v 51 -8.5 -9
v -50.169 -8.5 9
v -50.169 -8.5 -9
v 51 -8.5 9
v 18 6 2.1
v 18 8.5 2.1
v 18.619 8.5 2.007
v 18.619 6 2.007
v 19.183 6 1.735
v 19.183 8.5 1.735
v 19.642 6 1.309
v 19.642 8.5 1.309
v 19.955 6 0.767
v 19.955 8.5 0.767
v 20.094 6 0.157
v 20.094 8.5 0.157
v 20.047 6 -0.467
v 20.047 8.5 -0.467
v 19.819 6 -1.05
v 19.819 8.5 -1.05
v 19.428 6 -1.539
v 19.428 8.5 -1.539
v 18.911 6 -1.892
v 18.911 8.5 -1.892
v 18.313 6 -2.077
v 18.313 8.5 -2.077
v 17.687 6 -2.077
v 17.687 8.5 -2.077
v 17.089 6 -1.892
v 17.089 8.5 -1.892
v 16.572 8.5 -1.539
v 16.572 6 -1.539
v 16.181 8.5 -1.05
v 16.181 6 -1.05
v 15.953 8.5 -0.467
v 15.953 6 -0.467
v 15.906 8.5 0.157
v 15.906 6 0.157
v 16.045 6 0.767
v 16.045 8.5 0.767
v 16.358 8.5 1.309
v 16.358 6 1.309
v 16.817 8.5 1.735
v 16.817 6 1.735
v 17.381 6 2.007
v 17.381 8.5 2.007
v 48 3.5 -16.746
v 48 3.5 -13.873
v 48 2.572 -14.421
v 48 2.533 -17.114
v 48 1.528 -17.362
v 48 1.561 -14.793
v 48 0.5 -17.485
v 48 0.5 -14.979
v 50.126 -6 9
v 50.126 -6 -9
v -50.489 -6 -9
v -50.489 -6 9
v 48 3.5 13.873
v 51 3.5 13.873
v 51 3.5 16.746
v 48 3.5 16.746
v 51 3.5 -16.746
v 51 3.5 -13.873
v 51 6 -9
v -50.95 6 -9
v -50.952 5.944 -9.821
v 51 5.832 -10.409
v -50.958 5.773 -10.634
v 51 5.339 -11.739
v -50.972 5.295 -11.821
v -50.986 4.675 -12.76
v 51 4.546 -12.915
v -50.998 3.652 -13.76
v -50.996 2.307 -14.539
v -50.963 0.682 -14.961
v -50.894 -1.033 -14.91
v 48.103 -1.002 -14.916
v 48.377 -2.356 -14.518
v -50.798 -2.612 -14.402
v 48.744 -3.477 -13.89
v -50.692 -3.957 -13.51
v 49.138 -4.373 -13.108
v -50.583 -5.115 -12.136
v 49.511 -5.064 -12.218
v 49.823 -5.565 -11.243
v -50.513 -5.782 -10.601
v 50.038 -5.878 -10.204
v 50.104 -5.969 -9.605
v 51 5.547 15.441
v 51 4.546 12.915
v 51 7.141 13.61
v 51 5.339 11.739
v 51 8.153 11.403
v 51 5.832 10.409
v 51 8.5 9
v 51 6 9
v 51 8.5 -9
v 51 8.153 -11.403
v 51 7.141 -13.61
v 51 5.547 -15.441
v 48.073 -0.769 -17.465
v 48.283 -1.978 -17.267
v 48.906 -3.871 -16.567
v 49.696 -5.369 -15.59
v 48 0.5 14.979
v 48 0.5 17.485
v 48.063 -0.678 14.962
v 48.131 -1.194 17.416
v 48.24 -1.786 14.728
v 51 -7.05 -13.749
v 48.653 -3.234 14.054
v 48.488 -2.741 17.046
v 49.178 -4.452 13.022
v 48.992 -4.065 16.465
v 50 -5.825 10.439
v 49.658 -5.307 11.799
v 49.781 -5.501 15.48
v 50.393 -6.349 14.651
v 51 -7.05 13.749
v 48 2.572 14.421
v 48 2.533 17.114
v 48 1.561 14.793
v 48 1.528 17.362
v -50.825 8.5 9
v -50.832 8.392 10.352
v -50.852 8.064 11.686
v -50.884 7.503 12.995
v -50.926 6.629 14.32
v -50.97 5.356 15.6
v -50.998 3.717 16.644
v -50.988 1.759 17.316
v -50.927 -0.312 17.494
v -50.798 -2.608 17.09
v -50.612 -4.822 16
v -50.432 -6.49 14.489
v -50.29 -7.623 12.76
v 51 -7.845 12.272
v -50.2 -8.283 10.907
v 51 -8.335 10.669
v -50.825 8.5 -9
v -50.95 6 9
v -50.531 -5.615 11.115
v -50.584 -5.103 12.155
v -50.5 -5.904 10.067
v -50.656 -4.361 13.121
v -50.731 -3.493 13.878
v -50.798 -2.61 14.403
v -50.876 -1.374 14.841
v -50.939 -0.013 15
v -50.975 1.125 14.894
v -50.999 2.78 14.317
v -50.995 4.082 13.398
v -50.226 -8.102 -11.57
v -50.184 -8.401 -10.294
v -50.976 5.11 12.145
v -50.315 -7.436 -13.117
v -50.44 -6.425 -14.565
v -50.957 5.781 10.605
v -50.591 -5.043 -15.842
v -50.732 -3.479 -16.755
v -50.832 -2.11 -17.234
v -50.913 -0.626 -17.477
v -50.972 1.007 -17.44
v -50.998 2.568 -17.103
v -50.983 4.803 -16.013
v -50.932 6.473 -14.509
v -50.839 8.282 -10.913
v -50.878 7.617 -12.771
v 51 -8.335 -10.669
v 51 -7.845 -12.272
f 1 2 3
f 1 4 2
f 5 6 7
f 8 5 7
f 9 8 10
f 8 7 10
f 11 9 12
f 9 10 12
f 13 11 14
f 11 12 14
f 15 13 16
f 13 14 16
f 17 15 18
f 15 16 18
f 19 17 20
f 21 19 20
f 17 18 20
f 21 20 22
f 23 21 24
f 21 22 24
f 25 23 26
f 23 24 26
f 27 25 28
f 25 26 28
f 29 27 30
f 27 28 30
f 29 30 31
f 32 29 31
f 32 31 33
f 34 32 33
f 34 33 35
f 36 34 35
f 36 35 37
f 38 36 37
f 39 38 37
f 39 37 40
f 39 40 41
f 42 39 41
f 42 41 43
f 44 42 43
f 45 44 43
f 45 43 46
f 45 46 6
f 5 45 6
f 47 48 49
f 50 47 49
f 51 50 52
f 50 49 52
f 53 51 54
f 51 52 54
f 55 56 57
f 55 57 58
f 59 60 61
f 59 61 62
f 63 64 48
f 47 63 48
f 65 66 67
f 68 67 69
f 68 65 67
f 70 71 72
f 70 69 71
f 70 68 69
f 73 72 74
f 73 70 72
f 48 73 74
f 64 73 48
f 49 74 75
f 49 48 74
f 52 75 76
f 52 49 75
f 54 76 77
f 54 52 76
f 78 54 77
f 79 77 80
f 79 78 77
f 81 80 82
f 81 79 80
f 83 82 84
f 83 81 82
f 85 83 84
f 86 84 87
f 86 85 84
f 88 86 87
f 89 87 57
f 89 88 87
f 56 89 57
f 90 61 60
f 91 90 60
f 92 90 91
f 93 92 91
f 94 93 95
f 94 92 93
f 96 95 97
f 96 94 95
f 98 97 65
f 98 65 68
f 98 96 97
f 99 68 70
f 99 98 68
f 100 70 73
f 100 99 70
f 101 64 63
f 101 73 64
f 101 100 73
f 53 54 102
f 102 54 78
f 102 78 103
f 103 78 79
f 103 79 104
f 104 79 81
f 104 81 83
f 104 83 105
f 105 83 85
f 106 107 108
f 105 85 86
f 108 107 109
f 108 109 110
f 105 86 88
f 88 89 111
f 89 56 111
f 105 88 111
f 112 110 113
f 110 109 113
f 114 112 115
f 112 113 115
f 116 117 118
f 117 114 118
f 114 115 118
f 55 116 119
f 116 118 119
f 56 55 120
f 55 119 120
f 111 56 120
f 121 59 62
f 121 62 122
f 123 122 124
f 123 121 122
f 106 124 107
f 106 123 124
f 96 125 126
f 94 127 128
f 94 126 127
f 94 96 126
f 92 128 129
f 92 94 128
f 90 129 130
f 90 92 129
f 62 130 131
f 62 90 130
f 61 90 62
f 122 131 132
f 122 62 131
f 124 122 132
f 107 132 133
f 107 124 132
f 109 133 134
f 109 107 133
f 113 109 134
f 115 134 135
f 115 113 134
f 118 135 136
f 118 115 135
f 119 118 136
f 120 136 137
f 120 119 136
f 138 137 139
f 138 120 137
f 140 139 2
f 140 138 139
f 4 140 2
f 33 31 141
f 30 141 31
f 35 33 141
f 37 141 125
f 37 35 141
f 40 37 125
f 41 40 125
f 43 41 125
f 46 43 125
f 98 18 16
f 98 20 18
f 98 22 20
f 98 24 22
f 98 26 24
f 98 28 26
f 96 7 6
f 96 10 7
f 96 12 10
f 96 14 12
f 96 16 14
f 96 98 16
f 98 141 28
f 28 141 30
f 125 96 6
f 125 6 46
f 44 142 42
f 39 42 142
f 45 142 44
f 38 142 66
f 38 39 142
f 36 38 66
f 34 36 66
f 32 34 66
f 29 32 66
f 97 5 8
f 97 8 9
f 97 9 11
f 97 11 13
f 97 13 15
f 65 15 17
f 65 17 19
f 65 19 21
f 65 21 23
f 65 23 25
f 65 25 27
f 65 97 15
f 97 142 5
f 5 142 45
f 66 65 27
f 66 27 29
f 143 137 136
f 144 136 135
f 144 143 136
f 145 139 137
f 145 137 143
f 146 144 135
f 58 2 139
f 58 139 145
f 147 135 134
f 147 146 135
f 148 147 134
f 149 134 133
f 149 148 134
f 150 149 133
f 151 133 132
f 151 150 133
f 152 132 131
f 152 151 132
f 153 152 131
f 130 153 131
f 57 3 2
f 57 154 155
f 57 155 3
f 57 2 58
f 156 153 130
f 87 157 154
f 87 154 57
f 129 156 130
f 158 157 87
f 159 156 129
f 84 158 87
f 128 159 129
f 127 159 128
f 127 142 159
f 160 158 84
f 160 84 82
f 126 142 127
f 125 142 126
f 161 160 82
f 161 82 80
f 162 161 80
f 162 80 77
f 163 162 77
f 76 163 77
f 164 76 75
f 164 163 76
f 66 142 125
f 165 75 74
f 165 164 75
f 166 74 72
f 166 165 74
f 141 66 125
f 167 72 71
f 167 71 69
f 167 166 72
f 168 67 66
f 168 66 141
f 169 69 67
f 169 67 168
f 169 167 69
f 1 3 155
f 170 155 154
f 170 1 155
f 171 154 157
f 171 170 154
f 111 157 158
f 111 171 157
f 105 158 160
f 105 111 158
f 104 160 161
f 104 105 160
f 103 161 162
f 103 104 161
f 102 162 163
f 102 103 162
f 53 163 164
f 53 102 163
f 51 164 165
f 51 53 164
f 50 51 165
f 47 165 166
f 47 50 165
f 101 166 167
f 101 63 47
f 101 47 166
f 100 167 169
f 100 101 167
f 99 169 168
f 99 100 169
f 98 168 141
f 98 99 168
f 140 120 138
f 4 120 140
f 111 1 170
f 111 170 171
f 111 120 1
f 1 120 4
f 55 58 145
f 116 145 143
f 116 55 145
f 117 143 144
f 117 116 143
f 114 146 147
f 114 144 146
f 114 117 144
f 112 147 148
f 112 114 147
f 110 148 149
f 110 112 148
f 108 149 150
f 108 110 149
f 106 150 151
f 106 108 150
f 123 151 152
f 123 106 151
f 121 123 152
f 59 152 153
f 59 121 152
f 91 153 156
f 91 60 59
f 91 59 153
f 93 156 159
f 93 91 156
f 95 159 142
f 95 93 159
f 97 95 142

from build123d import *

# Parameters (mm, degrees)
EXTRUSION1_DEPTH             = 51
ENL_V_MAT_EXTRU_2_DEPTH      = 18.5
ENL_V_MAT_EXTRU_2_DEPTH_BACK = 18.5
ENL_V_MAT_EXTRU_3_REACH      = 19
ESQUISSE4_R                  = 2.1
ENL_V_MAT_EXTRU_4_DEPTH      = 18.5000001
ENL_V_MAT_EXTRU_4_DEPTH_BACK = 18.5000001


with BuildPart() as part:
    # Esquisse1 → Extrusion1 (new body, symmetric)
    with BuildSketch(Plane(origin=(0, 0, 0), x_dir=(0, 0, -1), z_dir=(1, 0, 0))):
        with BuildLine():
            Line((-9, -8.5), (9, -8.5))
            ThreePointArc((9, -8.5), (17.5, 0), (9, 8.5))
            Line((9, 8.5), (-9, 8.5))
            ThreePointArc((-9, 8.5), (-17.5, 0), (-9, -8.5))
        make_face()
        with BuildLine():
            Line((-9, 6), (9, 6))
            ThreePointArc((9, 6), (15, 0), (9, -6))
            Line((9, -6), (-9, -6))
            ThreePointArc((-9, -6), (-15, 0), (-9, 6))
        make_face(mode=Mode.SUBTRACT)
    extrude(amount=EXTRUSION1_DEPTH, both=True)

    # Esquisse3 → Enlèv. mat.-Extru.2 (cut, two sides)
    with BuildSketch(Plane.XY) as enl_v_mat_extru_2_sk:
        with BuildLine():
            Line((51, 3.5), (48, 3.5))
            Line((48, 3.5), (48, 0.5))
            ThreePointArc((48, 0.5), (48.77747585, -3.562019202), (51, -7.049834435))
            Line((51, -7.049834435), (51, 3.5))
        make_face()
    extrude(amount=ENL_V_MAT_EXTRU_2_DEPTH, mode=Mode.SUBTRACT)
    extrude(enl_v_mat_extru_2_sk.sketch, amount=-ENL_V_MAT_EXTRU_2_DEPTH_BACK, mode=Mode.SUBTRACT)

    # Esquisse4 → Enlèv. mat.-Extru.3 (cut, up to next)
    with BuildSketch(Plane(origin=(0, 8.5, 0), x_dir=(-1, 0, 0), z_dir=(0, 1, 0)), mode=Mode.PRIVATE) as enl_v_mat_extru_3_sk1:
        with Locations(Location((-18, 0, 0), (0, 0, 90))):  # turned: the seam where the file's is
            Circle(ESQUISSE4_R)
    enl_v_mat_extru_3_tool1 = extrude(enl_v_mat_extru_3_sk1.sketch, amount=-ENL_V_MAT_EXTRU_3_REACH, mode=Mode.PRIVATE) & part.part
    add(enl_v_mat_extru_3_tool1.solids().sort_by_distance((18, 8.5, 0))[0], mode=Mode.SUBTRACT)

    # Esquisse5 → Enlèv. mat.-Extru.4 (cut, two sides)
    with BuildSketch(Plane.XY) as enl_v_mat_extru_4_sk:
        with BuildLine():
            Line((60.682276478, -226.426742354), (-41.324705982, -35.5))
            ThreePointArc((-41.324705982, -35.5), (-49.153043001, -14.164640947), (-50.824705982, 8.5))
            Line((-50.824705982, 8.5), (-36.678065011, 224.505365595))
            Line((-36.678065011, 224.505365595), (-459.862900179, 133.135912547))
            Line((-459.862900179, 133.135912547), (-362.50255869, -317.796195402))
            Line((-362.50255869, -317.796195402), (60.682276478, -226.426742354))
        make_face()
    extrude(amount=ENL_V_MAT_EXTRU_4_DEPTH, mode=Mode.SUBTRACT)
    extrude(enl_v_mat_extru_4_sk.sketch, amount=-ENL_V_MAT_EXTRU_4_DEPTH_BACK, mode=Mode.SUBTRACT)


solid = part.part
